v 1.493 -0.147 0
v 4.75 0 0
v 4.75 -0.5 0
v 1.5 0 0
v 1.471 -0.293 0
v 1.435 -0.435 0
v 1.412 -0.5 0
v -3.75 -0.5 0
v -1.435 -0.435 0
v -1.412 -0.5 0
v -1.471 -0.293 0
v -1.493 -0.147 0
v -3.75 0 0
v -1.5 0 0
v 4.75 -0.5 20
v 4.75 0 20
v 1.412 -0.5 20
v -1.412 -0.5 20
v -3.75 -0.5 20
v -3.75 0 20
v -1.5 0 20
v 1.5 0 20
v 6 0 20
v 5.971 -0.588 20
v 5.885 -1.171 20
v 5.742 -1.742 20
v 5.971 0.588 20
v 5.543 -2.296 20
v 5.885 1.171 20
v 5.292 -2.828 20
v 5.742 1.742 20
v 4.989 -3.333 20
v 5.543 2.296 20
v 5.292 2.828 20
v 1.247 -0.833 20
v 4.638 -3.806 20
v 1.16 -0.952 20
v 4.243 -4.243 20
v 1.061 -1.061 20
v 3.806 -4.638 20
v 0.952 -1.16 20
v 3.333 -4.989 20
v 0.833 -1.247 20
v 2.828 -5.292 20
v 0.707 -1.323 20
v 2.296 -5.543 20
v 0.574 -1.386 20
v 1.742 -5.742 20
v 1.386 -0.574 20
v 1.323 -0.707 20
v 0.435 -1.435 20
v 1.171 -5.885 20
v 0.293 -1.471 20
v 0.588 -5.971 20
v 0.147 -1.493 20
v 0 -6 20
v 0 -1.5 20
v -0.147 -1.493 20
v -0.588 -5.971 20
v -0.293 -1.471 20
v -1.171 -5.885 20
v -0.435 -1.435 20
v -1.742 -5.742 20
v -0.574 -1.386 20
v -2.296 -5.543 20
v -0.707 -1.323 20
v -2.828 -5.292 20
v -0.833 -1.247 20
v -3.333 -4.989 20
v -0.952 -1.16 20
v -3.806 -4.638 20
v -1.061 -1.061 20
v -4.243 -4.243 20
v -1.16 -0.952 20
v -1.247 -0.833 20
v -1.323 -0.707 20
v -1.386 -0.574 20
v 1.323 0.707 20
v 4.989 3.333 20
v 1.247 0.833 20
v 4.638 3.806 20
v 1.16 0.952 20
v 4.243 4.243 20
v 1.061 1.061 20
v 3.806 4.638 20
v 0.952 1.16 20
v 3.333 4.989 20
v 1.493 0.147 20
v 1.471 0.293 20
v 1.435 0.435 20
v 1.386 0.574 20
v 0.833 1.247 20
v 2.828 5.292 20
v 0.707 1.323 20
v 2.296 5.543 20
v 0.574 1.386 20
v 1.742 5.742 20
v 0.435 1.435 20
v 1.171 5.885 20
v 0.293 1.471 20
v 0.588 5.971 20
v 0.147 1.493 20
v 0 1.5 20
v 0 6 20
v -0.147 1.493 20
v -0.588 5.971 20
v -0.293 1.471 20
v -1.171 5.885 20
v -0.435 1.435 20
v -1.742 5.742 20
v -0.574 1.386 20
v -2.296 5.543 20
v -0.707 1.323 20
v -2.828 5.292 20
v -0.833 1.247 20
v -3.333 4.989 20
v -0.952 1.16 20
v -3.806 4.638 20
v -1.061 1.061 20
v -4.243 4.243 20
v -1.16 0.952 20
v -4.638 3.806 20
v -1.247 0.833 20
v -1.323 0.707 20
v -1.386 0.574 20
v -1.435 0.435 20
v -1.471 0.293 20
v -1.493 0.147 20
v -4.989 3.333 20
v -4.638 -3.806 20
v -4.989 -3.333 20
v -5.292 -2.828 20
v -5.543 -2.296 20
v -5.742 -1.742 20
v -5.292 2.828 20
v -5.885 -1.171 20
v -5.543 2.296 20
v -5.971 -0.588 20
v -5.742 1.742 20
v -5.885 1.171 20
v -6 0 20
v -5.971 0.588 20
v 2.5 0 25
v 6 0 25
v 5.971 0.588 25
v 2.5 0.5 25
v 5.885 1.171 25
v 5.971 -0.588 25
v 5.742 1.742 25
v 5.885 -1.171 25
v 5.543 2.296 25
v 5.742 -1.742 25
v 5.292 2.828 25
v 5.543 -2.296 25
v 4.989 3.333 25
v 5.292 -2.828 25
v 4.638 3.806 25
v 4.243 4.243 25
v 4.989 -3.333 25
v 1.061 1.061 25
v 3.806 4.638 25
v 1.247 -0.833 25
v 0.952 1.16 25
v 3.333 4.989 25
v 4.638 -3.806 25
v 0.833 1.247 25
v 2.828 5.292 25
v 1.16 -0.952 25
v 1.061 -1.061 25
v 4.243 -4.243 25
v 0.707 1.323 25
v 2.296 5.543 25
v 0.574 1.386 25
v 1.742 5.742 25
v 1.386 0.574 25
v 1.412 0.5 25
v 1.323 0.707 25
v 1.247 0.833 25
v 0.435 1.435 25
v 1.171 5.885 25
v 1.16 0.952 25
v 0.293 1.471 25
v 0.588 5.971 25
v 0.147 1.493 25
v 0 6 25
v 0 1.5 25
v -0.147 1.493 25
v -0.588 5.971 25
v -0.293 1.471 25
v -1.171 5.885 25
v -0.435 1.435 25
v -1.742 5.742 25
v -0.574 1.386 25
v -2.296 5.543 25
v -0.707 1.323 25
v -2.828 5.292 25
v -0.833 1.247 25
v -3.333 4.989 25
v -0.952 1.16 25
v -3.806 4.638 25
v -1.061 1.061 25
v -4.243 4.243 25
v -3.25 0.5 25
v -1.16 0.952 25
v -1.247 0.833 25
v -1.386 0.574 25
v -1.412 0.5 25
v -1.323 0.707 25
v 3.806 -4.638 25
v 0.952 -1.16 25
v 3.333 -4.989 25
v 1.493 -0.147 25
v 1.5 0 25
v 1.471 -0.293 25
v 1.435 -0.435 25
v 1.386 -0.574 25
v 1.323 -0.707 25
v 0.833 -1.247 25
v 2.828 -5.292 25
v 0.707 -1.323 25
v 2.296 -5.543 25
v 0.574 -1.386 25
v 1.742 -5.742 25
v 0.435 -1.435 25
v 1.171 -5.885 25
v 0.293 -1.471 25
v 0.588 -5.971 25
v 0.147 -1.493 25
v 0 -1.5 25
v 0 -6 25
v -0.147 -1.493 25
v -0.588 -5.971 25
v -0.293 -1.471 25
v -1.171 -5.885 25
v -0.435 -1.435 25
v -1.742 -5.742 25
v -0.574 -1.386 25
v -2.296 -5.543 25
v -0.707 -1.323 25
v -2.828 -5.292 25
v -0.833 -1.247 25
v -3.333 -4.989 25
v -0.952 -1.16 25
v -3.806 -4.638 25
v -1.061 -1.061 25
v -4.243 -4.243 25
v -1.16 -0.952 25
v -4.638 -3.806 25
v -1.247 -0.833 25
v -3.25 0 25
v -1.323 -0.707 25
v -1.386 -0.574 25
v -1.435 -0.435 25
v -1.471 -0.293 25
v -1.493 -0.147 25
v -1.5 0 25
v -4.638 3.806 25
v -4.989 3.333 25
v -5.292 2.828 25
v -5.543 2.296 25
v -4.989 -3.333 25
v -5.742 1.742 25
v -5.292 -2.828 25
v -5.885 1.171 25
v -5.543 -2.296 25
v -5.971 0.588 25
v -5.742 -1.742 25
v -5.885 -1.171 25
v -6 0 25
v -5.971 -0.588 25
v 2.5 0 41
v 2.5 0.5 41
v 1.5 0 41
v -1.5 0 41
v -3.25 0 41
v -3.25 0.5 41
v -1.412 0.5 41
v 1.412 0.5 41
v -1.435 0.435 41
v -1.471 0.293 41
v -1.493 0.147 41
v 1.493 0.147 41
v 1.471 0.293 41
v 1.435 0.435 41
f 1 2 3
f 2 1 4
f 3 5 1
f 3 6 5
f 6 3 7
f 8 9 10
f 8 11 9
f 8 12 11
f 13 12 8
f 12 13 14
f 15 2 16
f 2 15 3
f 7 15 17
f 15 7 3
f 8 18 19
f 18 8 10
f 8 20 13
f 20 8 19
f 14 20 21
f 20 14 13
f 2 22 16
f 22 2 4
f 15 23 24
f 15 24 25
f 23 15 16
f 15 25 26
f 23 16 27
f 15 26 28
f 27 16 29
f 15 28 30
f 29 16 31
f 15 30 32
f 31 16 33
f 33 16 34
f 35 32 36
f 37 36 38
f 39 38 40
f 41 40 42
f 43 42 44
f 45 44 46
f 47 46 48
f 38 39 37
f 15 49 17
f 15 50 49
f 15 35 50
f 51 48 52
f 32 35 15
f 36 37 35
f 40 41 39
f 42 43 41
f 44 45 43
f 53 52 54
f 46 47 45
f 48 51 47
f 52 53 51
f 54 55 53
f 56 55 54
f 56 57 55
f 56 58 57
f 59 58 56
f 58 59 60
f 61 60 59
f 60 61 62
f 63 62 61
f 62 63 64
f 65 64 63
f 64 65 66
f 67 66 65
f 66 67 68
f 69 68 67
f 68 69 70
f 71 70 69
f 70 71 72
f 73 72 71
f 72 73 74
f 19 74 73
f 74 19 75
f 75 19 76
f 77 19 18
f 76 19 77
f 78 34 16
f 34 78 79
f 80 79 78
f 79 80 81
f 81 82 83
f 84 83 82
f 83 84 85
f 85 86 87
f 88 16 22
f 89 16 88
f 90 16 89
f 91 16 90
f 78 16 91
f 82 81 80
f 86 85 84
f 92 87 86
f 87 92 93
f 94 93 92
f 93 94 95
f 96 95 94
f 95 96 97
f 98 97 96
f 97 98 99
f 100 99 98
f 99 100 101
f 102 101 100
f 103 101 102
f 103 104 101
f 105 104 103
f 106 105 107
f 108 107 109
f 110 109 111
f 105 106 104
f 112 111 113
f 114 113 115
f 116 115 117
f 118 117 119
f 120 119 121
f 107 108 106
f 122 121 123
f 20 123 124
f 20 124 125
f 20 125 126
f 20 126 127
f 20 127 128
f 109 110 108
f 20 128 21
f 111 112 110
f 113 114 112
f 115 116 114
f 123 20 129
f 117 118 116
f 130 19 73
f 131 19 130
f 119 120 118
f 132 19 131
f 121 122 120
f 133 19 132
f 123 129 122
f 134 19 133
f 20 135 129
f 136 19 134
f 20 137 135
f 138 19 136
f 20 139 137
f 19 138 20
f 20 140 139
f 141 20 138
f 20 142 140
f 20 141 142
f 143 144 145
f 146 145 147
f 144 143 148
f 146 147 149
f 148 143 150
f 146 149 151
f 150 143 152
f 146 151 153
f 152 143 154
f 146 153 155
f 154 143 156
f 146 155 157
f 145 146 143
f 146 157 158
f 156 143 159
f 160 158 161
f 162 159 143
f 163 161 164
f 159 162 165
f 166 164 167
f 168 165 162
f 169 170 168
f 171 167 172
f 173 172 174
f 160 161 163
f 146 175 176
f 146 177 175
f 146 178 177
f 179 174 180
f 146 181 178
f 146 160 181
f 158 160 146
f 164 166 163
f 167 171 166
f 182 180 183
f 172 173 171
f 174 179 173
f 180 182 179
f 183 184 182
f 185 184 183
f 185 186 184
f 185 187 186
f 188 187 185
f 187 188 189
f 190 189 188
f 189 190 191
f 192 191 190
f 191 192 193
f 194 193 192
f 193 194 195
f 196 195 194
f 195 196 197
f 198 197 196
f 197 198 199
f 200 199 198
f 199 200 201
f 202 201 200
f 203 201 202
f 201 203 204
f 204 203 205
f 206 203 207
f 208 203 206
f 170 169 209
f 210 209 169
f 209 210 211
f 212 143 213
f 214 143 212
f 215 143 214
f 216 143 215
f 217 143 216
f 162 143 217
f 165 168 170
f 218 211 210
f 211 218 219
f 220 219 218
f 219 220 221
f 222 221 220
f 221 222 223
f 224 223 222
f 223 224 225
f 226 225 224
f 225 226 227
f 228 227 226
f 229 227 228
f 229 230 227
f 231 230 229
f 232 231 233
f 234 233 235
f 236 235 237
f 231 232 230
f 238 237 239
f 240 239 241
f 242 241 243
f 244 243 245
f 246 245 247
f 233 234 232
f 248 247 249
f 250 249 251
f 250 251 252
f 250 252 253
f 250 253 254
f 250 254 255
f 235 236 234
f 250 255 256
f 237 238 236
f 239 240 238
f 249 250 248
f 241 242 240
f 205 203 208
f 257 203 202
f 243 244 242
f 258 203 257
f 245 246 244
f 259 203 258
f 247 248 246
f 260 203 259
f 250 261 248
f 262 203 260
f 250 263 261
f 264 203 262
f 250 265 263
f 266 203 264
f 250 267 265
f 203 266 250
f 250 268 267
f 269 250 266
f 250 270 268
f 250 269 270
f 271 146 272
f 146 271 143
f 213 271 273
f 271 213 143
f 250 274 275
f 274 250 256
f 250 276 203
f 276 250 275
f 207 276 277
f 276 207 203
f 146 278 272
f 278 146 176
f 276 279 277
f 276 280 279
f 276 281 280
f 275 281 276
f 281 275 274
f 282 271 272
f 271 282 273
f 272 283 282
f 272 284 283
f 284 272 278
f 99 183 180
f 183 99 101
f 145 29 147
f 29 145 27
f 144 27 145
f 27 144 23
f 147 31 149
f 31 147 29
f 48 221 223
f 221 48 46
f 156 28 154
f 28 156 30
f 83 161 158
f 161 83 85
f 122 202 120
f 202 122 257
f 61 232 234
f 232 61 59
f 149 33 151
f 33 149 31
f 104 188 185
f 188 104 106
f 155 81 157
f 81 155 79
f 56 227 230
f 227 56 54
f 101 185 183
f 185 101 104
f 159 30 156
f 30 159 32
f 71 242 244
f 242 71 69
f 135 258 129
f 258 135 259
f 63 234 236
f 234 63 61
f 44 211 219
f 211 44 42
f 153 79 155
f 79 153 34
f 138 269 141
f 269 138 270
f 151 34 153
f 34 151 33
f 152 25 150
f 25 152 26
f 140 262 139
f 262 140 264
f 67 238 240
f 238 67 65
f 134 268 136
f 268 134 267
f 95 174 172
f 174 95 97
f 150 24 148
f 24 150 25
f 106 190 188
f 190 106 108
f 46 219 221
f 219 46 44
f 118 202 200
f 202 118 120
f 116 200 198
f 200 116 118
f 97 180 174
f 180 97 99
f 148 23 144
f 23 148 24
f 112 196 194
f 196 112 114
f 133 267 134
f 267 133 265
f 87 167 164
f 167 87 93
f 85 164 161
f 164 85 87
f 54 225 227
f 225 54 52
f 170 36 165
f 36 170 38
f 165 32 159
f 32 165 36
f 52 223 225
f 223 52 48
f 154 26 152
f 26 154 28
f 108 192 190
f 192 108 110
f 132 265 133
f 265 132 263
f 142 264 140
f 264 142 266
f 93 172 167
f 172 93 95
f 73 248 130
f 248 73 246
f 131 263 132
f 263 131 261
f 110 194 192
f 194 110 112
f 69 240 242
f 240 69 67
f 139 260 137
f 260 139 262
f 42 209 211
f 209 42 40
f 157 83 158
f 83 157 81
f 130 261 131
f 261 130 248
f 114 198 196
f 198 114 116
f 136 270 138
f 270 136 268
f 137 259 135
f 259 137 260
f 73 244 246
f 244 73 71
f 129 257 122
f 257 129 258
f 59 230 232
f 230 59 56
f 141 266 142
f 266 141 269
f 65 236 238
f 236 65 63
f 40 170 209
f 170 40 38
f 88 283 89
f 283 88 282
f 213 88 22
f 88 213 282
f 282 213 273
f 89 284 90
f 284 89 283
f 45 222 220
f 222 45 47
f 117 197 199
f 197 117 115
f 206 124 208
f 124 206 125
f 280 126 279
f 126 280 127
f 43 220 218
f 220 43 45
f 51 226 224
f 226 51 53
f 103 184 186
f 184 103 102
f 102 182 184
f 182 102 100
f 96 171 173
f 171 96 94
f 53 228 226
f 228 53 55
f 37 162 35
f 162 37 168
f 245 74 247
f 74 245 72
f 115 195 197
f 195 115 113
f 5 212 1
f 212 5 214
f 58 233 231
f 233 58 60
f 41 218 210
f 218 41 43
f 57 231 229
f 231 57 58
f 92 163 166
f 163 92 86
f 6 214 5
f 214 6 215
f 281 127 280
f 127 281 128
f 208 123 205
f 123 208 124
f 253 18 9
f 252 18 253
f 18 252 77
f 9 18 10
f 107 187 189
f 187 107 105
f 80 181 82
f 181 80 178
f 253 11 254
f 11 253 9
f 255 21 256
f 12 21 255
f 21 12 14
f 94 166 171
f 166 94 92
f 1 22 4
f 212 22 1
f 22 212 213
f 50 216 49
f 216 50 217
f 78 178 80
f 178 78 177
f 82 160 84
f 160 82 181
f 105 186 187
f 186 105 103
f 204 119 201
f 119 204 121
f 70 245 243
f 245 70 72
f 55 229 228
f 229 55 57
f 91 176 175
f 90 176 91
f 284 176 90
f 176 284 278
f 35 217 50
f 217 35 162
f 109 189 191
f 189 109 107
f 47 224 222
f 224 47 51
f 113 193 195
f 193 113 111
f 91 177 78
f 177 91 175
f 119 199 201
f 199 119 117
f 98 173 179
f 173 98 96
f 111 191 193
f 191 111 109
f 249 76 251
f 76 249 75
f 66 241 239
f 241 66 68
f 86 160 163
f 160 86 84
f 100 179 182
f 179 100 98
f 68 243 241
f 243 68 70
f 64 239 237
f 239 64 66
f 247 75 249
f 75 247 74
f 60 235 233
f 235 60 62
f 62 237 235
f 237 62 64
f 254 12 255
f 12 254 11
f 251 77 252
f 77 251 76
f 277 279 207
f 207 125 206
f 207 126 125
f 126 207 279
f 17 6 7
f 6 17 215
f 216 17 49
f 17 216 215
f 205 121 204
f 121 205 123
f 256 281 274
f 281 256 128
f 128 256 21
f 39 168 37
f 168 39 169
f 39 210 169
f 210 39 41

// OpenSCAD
// Hose-barb reducer: 8 mm tubing (barbs A) -> collar -> 5 mm tubing (barbs B)
// Print orientation: standing upright along +Z, centred on origin in X/Y

$fn = 64;

// ---- Dimensions (mm) ----
bore      = 3;    // through-bore diameter
barb_a_h  = 10;   // height of each 8 mm barb
barb_a_d  = 7.5;  // outer diameter of 8 mm barb (bottom)
barb_a_t  = 9.5;  // outer diameter of 8 mm barb (top)
collar_d  = 12;   // collar diameter (z = 20 to 25)
barb_b_h  = 8;    // height of each 5 mm barb
barb_b_d  = 6.5;  // outer diameter of 5 mm barb (bottom)
barb_b_t  = 5.0;  // outer diameter of 5 mm barb (top)
eps       = 0.5;  // overcut for clean differences

// ---- Derived ----
z0 = 0;
z_a = 20;         // top of 8 mm barbs
z_c = 25;         // top of collar / bottom of 5 mm barbs
z1 = 41;          // top of 5 mm barbs
n   = 2;          // number of stacked barbs on each side

// ---- Model ----
difference() {
    union() {
        // Barbs for 8 mm tubing
        for (i = [0 : n - 1])
            translate([0, 0, z0 + i * barb_a_h])
                linear_extrude(height = barb_a_h)
                    polygon([
                        [-barb_a_d / 2, 0],
                        [ barb_a_t / 2, 0],
                        [ barb_a_t / 2, -eps],
                        [-barb_a_d / 2, -eps]
                    ]);

        // Collar
        translate([0, 0, z_a])
            cylinder(d = collar_d, h = 5);

        // Barbs for 5 mm tubing
        for (i = [0 : n - 1])
            translate([0, 0, z_c + i * barb_b_h])
                linear_extrude(height = barb_b_h)
                    polygon([
                        [-barb_b_d / 2, 0],
                        [ barb_b_t / 2, 0],
                        [ barb_b_t / 2, eps],
                        [-barb_b_d / 2, eps]
                    ]);
    }

    // Full-length bore
    translate([0, 0, -eps])
        cylinder(d = bore, h = z1 + 2 * eps);
}
